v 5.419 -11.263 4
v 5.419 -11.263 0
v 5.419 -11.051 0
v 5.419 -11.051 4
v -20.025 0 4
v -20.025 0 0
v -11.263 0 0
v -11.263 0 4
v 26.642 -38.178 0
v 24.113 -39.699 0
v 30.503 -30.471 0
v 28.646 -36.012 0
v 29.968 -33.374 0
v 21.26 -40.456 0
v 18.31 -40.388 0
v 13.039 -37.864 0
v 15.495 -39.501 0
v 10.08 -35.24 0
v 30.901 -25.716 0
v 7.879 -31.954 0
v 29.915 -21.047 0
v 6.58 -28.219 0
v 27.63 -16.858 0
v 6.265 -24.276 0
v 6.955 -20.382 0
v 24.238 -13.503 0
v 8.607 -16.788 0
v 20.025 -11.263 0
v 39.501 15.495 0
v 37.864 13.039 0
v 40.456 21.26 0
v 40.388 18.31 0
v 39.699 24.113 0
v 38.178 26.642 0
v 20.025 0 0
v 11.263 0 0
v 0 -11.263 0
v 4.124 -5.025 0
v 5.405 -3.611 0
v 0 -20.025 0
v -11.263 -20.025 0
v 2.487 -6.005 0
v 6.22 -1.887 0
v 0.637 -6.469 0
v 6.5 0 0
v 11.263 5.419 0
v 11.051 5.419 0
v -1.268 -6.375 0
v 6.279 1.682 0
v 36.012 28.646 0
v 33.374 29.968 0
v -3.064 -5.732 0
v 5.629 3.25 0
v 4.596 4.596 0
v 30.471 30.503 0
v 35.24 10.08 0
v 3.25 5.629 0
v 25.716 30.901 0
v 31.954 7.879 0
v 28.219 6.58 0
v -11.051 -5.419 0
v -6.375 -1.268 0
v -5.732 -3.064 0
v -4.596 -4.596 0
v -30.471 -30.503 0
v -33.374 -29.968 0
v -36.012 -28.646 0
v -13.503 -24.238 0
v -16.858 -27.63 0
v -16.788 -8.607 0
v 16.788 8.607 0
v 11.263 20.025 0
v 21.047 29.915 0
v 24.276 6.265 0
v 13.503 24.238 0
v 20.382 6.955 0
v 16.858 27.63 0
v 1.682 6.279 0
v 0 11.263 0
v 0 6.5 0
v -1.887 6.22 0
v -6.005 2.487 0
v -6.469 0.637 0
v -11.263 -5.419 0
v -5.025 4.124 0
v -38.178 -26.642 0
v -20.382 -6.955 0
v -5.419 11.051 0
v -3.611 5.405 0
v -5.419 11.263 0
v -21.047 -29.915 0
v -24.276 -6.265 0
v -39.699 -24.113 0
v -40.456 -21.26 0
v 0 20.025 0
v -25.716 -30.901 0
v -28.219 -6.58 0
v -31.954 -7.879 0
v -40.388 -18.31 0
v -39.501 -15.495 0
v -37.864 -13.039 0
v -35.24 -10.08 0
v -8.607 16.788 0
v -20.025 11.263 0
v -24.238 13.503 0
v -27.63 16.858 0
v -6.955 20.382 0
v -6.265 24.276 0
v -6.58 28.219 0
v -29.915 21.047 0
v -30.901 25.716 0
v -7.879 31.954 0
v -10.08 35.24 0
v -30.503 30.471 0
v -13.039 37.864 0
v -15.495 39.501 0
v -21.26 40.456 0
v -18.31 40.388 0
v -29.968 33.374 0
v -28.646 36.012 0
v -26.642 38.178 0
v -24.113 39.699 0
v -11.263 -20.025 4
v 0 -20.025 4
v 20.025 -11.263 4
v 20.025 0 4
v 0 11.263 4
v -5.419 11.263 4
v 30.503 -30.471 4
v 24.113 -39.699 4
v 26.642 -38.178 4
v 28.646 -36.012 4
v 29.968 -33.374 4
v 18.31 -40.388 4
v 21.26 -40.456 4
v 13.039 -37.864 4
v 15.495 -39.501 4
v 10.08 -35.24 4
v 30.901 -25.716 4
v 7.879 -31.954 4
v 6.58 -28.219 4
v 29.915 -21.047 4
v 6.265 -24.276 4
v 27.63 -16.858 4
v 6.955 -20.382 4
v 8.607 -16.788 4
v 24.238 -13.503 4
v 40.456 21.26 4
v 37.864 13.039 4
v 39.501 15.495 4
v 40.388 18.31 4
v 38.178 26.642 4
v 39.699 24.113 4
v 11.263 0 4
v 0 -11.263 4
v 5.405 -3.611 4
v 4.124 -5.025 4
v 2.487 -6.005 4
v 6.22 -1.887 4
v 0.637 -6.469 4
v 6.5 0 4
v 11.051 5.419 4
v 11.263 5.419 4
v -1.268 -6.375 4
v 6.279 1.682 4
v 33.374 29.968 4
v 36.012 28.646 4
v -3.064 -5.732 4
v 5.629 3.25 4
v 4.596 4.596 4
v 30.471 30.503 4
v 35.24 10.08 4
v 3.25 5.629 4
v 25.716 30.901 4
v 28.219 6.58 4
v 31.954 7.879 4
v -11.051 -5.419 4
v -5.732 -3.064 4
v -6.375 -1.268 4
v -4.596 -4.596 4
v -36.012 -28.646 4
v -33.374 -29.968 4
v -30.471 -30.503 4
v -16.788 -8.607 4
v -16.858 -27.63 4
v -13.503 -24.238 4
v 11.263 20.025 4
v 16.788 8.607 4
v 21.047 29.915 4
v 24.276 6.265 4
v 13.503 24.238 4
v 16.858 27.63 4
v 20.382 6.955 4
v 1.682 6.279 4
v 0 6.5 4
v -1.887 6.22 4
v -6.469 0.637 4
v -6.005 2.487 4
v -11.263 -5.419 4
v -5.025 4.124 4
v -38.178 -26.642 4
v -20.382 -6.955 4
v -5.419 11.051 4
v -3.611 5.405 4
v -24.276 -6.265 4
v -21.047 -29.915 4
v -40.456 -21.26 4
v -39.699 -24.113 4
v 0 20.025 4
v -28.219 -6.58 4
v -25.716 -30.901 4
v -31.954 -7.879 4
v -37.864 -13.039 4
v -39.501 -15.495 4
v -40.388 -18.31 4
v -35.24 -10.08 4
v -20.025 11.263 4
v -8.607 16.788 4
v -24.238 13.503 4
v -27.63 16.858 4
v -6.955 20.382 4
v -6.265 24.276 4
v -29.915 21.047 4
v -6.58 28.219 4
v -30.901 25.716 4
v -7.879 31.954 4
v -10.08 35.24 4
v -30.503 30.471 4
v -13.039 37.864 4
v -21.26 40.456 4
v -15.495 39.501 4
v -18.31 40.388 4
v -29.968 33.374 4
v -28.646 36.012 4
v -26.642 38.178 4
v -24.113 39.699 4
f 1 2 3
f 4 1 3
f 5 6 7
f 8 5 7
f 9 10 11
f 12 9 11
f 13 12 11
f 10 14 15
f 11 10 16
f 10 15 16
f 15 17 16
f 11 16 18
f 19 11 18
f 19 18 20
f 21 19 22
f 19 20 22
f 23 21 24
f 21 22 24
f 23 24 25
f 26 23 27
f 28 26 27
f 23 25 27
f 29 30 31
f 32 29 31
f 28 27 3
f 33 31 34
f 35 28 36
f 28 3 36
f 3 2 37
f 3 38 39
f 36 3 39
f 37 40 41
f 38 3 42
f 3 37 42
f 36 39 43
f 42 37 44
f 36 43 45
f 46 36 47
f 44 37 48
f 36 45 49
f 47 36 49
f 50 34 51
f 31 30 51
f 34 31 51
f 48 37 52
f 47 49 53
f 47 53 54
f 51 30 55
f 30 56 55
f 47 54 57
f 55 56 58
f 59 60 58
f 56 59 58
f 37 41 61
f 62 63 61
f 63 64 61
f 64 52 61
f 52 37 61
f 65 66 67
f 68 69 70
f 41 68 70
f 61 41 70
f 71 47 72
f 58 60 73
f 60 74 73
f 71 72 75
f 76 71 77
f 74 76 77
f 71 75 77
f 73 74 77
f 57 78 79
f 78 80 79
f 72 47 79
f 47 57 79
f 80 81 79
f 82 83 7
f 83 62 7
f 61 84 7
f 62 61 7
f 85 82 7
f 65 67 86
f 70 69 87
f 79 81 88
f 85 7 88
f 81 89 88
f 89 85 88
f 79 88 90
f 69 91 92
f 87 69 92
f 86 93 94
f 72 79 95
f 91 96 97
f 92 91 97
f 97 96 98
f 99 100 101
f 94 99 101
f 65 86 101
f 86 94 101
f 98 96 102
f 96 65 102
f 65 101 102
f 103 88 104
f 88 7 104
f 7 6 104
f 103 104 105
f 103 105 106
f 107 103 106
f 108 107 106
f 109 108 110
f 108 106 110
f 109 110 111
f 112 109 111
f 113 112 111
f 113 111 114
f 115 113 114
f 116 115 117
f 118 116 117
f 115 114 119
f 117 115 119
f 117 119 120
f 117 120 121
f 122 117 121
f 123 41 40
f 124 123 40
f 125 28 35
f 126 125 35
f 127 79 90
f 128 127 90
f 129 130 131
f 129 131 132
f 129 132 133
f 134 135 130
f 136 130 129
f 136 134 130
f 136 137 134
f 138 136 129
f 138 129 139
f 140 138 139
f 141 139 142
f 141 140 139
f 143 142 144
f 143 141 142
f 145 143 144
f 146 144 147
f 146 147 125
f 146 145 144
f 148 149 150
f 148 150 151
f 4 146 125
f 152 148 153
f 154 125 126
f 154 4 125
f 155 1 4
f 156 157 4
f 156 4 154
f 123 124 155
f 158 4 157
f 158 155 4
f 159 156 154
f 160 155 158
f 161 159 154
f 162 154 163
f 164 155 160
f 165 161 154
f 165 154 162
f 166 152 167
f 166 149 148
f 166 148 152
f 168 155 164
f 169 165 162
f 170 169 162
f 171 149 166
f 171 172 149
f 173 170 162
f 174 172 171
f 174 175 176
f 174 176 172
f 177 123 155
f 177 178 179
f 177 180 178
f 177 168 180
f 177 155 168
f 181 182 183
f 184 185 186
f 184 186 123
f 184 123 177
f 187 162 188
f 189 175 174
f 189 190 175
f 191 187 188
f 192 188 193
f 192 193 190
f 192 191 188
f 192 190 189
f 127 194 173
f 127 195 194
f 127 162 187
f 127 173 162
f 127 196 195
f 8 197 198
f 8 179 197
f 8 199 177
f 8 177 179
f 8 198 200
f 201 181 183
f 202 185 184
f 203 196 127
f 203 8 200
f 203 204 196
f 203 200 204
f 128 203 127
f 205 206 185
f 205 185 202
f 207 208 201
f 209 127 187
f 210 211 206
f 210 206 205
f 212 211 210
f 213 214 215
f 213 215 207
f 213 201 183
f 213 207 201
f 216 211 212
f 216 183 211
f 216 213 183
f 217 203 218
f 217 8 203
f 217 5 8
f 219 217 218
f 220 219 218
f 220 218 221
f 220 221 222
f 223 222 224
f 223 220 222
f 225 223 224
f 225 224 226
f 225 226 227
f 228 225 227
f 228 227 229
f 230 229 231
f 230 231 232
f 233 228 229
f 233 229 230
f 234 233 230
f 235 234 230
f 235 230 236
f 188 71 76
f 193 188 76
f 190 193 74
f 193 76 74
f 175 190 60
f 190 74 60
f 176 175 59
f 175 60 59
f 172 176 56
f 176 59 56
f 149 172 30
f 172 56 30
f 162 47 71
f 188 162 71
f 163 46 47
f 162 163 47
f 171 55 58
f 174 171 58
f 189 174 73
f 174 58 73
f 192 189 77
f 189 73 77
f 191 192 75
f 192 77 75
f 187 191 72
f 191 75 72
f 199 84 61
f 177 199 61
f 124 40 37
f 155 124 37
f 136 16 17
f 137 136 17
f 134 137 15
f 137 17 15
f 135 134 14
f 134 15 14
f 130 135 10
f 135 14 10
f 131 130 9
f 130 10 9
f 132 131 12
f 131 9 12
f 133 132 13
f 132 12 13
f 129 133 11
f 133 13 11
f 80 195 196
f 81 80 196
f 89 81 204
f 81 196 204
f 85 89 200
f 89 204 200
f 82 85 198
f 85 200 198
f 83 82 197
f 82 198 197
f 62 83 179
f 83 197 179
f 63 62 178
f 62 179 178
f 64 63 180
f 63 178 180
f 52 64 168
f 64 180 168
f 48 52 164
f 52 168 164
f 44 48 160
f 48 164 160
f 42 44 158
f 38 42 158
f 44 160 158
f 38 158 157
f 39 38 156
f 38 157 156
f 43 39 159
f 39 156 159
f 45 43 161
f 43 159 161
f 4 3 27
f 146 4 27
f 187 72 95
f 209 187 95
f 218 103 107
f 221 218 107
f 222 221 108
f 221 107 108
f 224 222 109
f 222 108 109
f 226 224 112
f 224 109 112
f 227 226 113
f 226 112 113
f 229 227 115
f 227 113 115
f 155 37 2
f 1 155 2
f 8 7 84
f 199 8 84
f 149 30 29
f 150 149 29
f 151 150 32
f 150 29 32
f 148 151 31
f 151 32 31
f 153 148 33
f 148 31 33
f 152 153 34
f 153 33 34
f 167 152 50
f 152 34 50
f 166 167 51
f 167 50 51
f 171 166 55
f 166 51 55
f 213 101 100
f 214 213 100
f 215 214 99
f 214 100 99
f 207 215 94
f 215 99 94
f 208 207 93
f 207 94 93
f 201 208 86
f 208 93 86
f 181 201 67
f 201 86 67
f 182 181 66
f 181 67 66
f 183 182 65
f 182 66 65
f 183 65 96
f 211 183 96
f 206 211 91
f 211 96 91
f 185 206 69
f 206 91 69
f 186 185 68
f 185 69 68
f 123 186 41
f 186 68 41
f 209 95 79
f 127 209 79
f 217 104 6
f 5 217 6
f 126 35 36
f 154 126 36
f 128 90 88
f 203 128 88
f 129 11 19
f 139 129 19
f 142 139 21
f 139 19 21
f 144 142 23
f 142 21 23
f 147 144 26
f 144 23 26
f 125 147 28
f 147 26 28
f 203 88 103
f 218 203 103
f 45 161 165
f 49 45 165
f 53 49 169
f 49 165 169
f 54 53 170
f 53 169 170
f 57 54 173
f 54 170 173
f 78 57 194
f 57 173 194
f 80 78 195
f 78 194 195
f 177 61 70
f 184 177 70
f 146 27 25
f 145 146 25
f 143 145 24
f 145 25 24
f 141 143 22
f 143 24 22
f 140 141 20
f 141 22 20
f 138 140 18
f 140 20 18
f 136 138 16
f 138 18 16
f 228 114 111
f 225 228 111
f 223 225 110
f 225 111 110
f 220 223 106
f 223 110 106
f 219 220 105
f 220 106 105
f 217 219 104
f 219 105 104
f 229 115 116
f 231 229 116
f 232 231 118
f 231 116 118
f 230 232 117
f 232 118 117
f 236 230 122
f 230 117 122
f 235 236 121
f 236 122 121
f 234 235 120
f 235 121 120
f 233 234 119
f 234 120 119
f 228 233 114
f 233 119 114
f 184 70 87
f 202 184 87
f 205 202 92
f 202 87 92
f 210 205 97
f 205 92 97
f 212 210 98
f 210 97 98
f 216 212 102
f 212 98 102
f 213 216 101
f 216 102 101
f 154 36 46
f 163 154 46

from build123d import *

# Parameters (mm, degrees)
F1_DEPTH = 4
F2_COUNT = 4
F4_DEPTH = 5


with BuildPart() as f1:
    # F0 (on Top) → F1 (new body)
    with BuildSketch(Plane.XY):
        with BuildLine():
            Line((-11.3897752017, 0), (0, 0))
            Line((0, 0), (0, 11.2630287185))
            Line((0, 11.2630287185), (-5.4190037772, 11.2630287185))
            Line((-5.4190037772, 11.2630287185), (-5.4190037772, 11.0505186021))
            Line((-5.4190037772, 11.0505186021), (-8.6066536605, 16.7882870883))
            ThreePointArc((-8.6066536605, 16.7882870883), (-6.5795750519, 28.2187096113), (-13.0392942344, 37.8642077748))
            ThreePointArc((-13.0392942344, 37.8642077748), (-24.1128062403, 39.6994920993), (-30.5027211192, 30.4712785919))
            ThreePointArc((-30.5027211192, 30.4712785919), (-28.9257647374, 18.8694362404), (-20.024523139, 11.2630287185))
            Line((-20.024523139, 11.2630287185), (-20.024523139, 0))
            Line((-20.024523139, 0), (-11.3897752017, 0))
        make_face()
    extrude(amount=F1_DEPTH)

    # F2: F1 ×4 about axis
    f2_axis = Axis((0, 0, 2), (0, 0, -1))


with BuildPart() as f1_1:
    add(f1.part)
    for i in range(1, F2_COUNT):
        add(f1.part.rotate(f2_axis, i * 360 / F2_COUNT))

    # F3 (on face) → F4 (cut)
    with BuildSketch(Plane.XY.offset(4)):
        with BuildLine():
            ThreePointArc((0, 6.5), (-4.5961940777, -4.5961940777), (6.5, 0))
            ThreePointArc((6.5, 0), (4.5961940777, 4.5961940777), (0, 6.5))
        make_face()
    extrude(amount=-F4_DEPTH, mode=Mode.SUBTRACT)


solid = f1_1.part
